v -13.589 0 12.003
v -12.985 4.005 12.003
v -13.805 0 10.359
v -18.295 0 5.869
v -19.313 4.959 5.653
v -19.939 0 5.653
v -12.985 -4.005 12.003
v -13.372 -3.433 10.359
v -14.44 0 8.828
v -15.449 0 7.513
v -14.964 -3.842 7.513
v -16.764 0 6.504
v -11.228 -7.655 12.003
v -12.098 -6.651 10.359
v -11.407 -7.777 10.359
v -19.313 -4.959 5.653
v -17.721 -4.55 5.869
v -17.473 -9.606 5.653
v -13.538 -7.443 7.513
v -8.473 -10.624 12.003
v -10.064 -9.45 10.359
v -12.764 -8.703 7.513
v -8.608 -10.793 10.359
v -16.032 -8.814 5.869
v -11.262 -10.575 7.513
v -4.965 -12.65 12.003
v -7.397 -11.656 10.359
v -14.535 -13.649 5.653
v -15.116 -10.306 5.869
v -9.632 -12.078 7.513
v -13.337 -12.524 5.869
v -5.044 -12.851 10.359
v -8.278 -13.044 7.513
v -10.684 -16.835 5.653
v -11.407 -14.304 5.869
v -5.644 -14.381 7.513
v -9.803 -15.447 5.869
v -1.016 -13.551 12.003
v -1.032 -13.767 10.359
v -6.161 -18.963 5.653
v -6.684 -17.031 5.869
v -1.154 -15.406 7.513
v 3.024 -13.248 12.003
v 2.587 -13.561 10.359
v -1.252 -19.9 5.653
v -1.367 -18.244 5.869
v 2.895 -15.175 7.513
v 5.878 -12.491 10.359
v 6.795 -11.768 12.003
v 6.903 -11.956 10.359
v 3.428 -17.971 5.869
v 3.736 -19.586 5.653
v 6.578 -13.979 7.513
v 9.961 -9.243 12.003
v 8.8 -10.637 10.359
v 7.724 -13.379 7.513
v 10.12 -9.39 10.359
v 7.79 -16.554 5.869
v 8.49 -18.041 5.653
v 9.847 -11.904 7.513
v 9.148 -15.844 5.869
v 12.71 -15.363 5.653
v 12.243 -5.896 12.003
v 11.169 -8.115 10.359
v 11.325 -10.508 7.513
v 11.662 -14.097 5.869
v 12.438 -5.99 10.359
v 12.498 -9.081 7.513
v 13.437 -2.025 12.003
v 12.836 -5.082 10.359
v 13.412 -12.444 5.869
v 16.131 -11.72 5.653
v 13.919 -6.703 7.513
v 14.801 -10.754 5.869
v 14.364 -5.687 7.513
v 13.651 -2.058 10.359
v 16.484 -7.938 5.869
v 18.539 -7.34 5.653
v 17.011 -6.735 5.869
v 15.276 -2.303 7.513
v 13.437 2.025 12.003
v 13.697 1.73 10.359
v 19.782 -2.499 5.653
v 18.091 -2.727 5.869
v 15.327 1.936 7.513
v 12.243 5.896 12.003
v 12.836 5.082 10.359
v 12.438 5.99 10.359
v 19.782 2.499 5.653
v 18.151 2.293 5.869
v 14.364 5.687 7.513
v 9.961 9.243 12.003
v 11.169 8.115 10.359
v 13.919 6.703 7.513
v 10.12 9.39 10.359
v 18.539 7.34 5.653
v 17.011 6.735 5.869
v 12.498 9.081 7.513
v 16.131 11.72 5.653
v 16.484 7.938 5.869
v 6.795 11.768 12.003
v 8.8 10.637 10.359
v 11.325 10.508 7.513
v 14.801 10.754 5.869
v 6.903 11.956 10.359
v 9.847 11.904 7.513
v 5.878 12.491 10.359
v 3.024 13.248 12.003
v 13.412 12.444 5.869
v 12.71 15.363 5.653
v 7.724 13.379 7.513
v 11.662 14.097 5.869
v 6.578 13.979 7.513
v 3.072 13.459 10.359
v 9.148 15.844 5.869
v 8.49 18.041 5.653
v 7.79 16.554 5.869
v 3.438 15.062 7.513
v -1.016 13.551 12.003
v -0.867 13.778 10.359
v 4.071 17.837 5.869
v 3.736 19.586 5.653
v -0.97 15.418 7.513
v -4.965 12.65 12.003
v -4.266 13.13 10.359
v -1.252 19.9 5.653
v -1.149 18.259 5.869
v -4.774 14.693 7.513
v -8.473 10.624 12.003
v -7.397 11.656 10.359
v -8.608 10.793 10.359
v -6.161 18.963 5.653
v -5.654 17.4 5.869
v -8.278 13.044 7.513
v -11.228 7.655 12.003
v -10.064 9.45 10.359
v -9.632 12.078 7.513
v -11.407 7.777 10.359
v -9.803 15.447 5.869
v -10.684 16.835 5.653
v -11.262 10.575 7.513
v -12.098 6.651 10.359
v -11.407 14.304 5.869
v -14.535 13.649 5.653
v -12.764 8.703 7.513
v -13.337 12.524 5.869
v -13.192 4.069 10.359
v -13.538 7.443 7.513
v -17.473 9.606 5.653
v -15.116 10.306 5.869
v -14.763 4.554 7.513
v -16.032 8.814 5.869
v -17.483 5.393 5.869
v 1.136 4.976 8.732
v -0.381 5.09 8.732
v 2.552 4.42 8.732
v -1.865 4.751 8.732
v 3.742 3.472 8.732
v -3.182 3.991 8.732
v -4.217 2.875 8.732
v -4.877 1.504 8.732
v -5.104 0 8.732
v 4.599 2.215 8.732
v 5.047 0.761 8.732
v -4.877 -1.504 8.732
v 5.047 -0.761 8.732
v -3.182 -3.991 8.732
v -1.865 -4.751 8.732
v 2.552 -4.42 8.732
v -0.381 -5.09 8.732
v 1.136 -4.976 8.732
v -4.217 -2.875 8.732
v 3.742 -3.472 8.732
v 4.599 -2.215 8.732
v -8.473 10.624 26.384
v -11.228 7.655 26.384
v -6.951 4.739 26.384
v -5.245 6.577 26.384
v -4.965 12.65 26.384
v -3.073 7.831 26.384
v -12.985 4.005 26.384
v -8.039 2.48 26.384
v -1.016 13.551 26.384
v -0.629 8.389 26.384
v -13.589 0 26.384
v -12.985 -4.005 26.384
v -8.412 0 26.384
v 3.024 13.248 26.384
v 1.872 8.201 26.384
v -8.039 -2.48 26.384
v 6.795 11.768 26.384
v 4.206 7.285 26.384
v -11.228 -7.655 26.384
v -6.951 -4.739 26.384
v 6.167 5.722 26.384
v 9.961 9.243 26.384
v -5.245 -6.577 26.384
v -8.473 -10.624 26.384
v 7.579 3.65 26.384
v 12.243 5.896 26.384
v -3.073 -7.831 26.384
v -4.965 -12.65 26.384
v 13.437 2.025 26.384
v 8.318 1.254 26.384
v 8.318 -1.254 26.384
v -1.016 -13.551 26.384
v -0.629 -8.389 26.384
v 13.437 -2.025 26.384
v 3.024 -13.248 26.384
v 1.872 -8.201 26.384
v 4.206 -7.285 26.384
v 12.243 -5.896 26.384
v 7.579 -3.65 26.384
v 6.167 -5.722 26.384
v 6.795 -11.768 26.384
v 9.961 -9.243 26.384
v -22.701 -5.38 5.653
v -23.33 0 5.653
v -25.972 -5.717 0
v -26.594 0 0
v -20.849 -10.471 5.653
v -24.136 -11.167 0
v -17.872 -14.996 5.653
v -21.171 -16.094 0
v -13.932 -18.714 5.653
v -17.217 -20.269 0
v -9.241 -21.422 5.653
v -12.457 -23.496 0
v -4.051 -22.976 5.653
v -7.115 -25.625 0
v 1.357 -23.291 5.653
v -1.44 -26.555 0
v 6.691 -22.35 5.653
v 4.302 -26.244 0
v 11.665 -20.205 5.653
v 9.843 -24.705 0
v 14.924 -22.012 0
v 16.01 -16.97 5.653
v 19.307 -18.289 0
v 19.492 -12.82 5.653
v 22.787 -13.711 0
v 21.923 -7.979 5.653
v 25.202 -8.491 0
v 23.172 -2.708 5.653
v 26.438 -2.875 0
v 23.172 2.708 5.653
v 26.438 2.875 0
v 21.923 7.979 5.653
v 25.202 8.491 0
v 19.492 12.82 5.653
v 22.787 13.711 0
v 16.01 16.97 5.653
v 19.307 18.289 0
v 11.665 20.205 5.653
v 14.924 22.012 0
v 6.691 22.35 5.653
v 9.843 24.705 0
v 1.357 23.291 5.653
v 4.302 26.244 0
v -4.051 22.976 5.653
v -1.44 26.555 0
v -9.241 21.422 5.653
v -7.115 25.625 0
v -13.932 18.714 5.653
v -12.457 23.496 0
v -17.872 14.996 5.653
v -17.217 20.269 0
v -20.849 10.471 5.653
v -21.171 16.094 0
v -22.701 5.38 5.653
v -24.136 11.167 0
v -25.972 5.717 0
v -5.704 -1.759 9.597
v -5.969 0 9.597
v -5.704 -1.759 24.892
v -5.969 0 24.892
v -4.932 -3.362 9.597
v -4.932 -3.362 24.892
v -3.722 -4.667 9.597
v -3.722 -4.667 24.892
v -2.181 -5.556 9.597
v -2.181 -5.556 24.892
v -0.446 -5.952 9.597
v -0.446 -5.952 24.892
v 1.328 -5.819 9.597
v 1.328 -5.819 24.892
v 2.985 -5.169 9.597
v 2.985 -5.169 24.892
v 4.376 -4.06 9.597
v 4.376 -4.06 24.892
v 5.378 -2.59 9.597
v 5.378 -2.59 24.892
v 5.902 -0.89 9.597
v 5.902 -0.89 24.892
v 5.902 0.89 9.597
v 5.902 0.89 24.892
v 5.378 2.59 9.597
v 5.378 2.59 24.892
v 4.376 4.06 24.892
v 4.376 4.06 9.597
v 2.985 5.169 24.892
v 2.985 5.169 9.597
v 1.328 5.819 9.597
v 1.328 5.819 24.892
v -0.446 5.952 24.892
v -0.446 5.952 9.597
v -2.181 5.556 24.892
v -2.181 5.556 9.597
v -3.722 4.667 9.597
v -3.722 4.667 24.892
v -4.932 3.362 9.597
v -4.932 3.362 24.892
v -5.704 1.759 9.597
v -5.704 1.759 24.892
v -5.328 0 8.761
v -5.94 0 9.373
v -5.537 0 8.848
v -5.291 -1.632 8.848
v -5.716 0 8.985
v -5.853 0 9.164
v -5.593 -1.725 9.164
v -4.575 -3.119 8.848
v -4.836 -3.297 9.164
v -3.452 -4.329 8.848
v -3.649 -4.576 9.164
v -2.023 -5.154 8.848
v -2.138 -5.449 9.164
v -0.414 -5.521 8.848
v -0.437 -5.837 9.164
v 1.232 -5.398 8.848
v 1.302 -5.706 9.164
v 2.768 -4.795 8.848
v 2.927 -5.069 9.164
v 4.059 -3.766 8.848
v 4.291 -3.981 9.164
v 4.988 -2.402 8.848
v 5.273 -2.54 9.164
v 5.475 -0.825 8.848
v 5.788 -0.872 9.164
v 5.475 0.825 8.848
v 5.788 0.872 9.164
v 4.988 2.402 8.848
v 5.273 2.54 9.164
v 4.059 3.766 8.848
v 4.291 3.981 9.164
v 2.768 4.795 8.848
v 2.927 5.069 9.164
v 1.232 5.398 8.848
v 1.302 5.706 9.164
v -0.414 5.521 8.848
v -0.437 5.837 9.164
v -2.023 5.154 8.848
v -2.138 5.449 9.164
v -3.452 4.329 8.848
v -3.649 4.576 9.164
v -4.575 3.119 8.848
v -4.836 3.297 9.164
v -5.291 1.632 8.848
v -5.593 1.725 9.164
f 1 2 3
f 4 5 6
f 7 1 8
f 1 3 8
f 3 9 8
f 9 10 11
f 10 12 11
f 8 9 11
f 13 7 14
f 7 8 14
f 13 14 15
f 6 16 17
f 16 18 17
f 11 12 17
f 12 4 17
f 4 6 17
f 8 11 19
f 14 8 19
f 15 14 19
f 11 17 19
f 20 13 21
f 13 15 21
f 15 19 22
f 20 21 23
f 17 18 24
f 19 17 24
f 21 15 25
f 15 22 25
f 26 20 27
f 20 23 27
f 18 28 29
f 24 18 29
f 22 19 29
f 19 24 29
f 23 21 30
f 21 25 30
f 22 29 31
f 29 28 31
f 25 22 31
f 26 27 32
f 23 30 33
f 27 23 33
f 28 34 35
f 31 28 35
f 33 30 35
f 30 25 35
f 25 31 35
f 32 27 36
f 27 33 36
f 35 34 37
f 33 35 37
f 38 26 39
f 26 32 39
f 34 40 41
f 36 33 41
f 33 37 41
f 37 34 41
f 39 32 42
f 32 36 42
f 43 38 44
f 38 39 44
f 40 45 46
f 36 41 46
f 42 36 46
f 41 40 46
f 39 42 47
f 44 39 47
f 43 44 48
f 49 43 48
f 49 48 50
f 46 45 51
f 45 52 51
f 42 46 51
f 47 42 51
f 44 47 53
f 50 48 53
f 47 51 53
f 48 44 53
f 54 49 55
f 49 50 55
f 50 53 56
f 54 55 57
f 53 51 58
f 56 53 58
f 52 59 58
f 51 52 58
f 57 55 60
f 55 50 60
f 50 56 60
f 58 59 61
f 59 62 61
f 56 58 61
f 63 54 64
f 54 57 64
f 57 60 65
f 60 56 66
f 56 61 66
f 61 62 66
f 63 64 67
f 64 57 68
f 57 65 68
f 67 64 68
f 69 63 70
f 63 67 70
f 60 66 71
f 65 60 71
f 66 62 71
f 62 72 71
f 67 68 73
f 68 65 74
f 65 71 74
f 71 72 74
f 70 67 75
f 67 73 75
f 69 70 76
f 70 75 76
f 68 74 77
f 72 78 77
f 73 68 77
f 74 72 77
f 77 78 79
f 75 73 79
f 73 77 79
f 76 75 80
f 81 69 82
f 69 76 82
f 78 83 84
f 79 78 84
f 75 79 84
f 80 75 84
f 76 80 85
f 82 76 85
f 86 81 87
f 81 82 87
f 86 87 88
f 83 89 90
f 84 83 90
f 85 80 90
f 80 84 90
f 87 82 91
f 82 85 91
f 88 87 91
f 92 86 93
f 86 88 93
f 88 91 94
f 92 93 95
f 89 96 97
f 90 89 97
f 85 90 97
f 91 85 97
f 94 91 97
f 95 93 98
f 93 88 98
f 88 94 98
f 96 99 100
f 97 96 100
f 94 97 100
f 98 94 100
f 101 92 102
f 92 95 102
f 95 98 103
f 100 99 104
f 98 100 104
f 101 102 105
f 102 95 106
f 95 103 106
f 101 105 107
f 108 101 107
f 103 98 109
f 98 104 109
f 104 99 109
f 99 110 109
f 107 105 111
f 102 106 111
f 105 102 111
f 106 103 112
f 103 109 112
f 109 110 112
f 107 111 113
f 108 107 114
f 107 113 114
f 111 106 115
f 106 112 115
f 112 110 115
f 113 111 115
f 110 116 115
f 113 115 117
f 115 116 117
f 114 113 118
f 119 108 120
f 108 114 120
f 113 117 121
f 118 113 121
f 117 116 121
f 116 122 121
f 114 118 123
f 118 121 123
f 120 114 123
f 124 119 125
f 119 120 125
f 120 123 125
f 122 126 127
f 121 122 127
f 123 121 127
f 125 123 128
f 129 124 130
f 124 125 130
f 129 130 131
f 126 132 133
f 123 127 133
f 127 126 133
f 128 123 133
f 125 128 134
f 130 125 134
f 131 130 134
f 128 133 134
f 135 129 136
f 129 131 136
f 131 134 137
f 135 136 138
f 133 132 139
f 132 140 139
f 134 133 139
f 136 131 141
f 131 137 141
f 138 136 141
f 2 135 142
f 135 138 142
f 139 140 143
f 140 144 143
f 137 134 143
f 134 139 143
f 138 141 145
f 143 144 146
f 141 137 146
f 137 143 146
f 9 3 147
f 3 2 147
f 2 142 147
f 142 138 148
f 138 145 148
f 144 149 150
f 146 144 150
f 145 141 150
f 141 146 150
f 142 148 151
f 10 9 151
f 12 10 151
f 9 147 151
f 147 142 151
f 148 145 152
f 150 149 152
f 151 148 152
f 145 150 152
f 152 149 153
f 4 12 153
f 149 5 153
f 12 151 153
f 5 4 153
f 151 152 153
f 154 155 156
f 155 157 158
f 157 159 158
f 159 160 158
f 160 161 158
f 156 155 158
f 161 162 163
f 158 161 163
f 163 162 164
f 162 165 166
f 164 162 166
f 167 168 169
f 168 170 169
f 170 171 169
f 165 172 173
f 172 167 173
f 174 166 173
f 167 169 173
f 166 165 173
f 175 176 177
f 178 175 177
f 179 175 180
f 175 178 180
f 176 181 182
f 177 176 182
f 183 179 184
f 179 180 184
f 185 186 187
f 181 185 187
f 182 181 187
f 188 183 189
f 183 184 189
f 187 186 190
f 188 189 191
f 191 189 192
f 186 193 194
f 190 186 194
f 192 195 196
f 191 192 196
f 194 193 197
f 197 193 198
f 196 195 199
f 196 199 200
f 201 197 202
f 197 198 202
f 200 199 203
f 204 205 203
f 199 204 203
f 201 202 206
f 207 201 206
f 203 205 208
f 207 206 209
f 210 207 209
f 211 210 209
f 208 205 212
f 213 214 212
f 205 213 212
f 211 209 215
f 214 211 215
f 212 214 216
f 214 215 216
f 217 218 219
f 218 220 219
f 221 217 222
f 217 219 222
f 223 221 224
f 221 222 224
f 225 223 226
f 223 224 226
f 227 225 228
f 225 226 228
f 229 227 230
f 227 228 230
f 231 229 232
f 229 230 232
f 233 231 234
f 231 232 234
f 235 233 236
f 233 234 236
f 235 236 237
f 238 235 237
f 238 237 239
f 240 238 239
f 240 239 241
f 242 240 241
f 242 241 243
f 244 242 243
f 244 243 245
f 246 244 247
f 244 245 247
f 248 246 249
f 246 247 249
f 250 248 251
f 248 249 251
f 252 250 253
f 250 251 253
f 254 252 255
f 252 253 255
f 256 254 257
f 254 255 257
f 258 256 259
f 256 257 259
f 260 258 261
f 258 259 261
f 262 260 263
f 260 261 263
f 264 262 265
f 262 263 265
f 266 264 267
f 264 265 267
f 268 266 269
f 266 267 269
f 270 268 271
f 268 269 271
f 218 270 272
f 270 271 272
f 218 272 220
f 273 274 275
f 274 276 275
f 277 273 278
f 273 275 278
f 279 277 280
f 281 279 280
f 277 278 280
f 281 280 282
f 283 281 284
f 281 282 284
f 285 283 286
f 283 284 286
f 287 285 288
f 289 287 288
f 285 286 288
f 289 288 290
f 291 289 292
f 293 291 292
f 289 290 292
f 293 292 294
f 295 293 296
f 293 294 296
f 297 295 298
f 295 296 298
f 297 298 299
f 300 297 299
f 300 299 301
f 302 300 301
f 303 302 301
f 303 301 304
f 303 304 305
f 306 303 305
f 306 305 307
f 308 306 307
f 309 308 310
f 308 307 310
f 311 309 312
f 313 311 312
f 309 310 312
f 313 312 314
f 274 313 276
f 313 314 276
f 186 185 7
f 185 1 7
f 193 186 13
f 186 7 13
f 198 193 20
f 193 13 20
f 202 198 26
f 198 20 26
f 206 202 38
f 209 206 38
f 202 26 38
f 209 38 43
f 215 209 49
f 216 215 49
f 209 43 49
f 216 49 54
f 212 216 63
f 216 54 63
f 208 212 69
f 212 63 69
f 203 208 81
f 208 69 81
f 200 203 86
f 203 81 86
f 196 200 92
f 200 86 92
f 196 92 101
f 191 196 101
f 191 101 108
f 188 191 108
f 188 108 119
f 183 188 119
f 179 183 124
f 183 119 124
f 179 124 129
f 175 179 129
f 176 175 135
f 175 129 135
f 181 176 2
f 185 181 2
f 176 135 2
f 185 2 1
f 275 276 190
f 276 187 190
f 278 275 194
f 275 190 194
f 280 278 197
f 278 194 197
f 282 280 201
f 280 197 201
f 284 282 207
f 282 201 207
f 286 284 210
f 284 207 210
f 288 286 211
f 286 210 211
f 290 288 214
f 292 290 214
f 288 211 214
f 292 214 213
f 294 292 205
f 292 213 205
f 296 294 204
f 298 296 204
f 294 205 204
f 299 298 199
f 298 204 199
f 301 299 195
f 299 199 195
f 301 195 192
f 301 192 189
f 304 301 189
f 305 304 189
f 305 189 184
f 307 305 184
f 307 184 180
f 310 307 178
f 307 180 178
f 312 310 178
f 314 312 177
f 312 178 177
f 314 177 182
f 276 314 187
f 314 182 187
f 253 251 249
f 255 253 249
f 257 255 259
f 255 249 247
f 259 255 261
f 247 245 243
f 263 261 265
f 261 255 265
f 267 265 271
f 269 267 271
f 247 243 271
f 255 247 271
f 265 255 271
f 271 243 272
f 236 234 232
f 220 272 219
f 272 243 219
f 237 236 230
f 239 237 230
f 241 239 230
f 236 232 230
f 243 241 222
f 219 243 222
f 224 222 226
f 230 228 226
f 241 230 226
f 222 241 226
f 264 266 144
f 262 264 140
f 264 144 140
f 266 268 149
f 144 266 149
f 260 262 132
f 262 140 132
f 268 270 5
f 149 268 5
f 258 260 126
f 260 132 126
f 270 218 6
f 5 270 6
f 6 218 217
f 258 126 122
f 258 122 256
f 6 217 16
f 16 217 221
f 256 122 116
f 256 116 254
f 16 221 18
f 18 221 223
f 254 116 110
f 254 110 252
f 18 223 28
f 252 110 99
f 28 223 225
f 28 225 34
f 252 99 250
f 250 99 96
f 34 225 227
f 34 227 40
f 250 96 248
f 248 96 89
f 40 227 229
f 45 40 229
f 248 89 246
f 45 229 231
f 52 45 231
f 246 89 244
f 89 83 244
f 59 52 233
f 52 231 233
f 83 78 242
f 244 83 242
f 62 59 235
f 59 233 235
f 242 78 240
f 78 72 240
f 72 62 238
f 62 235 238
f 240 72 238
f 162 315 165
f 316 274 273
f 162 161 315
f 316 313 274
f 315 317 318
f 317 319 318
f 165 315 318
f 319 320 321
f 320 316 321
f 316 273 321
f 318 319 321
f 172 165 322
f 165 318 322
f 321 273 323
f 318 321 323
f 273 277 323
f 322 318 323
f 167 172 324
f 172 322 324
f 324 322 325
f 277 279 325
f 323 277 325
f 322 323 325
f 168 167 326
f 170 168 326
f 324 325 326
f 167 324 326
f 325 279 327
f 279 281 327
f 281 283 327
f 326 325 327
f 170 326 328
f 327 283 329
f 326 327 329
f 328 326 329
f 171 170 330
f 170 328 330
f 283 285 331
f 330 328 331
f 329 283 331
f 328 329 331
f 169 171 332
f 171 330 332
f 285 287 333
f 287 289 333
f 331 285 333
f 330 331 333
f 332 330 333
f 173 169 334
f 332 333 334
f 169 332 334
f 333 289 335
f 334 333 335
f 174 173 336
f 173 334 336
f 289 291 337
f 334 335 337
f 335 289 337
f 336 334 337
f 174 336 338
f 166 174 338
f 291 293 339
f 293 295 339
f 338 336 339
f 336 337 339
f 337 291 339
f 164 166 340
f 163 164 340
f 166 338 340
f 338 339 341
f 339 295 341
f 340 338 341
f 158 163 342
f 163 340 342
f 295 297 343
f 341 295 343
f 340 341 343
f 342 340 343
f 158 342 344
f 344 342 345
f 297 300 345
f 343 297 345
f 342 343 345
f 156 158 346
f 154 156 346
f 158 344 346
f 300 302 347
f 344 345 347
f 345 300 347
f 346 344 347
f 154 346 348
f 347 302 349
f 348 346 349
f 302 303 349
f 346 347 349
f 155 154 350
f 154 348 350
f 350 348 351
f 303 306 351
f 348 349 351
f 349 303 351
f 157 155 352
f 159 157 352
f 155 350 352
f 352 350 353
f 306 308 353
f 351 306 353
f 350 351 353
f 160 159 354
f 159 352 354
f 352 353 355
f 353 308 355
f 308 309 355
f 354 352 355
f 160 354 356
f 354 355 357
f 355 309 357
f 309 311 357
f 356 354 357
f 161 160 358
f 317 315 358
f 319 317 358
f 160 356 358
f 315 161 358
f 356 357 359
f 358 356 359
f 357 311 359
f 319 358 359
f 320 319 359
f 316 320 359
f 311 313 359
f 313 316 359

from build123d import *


with BuildPart() as f1:
    # F0 (on Front) → F1 (revolve)
    with BuildSketch(Plane.XZ):
        with BuildLine():
            Line((-5.969, 9.596622), (-5.969, 24.892))
            Line((-5.969, 24.892), (-8.412302, 26.384082))
            Line((-8.412302, 26.384082), (-13.589, 26.384082))
            Line((-13.589, 26.384082), (-13.589, 12.002977))
            ThreePointArc((-13.589, 12.002977), (-15.448872, 7.512849), (-19.939, 5.652977))
            Line((-19.939, 5.652977), (-23.33023, 5.652977))
            Line((-23.33023, 5.652977), (-26.593978, 0))
            Line((-26.593978, 0), (0, 0))
            Line((0, 0), (0, 8.731734))
            Line((0, 8.731734), (-5.104112, 8.731734))
            ThreePointArc((-5.104112, 8.731734), (-5.71568, 8.985054), (-5.969, 9.596622))
        make_face()
    revolve(axis=Axis((0, 0, 12.446), (0, 0, 1)))


solid = f1.part
